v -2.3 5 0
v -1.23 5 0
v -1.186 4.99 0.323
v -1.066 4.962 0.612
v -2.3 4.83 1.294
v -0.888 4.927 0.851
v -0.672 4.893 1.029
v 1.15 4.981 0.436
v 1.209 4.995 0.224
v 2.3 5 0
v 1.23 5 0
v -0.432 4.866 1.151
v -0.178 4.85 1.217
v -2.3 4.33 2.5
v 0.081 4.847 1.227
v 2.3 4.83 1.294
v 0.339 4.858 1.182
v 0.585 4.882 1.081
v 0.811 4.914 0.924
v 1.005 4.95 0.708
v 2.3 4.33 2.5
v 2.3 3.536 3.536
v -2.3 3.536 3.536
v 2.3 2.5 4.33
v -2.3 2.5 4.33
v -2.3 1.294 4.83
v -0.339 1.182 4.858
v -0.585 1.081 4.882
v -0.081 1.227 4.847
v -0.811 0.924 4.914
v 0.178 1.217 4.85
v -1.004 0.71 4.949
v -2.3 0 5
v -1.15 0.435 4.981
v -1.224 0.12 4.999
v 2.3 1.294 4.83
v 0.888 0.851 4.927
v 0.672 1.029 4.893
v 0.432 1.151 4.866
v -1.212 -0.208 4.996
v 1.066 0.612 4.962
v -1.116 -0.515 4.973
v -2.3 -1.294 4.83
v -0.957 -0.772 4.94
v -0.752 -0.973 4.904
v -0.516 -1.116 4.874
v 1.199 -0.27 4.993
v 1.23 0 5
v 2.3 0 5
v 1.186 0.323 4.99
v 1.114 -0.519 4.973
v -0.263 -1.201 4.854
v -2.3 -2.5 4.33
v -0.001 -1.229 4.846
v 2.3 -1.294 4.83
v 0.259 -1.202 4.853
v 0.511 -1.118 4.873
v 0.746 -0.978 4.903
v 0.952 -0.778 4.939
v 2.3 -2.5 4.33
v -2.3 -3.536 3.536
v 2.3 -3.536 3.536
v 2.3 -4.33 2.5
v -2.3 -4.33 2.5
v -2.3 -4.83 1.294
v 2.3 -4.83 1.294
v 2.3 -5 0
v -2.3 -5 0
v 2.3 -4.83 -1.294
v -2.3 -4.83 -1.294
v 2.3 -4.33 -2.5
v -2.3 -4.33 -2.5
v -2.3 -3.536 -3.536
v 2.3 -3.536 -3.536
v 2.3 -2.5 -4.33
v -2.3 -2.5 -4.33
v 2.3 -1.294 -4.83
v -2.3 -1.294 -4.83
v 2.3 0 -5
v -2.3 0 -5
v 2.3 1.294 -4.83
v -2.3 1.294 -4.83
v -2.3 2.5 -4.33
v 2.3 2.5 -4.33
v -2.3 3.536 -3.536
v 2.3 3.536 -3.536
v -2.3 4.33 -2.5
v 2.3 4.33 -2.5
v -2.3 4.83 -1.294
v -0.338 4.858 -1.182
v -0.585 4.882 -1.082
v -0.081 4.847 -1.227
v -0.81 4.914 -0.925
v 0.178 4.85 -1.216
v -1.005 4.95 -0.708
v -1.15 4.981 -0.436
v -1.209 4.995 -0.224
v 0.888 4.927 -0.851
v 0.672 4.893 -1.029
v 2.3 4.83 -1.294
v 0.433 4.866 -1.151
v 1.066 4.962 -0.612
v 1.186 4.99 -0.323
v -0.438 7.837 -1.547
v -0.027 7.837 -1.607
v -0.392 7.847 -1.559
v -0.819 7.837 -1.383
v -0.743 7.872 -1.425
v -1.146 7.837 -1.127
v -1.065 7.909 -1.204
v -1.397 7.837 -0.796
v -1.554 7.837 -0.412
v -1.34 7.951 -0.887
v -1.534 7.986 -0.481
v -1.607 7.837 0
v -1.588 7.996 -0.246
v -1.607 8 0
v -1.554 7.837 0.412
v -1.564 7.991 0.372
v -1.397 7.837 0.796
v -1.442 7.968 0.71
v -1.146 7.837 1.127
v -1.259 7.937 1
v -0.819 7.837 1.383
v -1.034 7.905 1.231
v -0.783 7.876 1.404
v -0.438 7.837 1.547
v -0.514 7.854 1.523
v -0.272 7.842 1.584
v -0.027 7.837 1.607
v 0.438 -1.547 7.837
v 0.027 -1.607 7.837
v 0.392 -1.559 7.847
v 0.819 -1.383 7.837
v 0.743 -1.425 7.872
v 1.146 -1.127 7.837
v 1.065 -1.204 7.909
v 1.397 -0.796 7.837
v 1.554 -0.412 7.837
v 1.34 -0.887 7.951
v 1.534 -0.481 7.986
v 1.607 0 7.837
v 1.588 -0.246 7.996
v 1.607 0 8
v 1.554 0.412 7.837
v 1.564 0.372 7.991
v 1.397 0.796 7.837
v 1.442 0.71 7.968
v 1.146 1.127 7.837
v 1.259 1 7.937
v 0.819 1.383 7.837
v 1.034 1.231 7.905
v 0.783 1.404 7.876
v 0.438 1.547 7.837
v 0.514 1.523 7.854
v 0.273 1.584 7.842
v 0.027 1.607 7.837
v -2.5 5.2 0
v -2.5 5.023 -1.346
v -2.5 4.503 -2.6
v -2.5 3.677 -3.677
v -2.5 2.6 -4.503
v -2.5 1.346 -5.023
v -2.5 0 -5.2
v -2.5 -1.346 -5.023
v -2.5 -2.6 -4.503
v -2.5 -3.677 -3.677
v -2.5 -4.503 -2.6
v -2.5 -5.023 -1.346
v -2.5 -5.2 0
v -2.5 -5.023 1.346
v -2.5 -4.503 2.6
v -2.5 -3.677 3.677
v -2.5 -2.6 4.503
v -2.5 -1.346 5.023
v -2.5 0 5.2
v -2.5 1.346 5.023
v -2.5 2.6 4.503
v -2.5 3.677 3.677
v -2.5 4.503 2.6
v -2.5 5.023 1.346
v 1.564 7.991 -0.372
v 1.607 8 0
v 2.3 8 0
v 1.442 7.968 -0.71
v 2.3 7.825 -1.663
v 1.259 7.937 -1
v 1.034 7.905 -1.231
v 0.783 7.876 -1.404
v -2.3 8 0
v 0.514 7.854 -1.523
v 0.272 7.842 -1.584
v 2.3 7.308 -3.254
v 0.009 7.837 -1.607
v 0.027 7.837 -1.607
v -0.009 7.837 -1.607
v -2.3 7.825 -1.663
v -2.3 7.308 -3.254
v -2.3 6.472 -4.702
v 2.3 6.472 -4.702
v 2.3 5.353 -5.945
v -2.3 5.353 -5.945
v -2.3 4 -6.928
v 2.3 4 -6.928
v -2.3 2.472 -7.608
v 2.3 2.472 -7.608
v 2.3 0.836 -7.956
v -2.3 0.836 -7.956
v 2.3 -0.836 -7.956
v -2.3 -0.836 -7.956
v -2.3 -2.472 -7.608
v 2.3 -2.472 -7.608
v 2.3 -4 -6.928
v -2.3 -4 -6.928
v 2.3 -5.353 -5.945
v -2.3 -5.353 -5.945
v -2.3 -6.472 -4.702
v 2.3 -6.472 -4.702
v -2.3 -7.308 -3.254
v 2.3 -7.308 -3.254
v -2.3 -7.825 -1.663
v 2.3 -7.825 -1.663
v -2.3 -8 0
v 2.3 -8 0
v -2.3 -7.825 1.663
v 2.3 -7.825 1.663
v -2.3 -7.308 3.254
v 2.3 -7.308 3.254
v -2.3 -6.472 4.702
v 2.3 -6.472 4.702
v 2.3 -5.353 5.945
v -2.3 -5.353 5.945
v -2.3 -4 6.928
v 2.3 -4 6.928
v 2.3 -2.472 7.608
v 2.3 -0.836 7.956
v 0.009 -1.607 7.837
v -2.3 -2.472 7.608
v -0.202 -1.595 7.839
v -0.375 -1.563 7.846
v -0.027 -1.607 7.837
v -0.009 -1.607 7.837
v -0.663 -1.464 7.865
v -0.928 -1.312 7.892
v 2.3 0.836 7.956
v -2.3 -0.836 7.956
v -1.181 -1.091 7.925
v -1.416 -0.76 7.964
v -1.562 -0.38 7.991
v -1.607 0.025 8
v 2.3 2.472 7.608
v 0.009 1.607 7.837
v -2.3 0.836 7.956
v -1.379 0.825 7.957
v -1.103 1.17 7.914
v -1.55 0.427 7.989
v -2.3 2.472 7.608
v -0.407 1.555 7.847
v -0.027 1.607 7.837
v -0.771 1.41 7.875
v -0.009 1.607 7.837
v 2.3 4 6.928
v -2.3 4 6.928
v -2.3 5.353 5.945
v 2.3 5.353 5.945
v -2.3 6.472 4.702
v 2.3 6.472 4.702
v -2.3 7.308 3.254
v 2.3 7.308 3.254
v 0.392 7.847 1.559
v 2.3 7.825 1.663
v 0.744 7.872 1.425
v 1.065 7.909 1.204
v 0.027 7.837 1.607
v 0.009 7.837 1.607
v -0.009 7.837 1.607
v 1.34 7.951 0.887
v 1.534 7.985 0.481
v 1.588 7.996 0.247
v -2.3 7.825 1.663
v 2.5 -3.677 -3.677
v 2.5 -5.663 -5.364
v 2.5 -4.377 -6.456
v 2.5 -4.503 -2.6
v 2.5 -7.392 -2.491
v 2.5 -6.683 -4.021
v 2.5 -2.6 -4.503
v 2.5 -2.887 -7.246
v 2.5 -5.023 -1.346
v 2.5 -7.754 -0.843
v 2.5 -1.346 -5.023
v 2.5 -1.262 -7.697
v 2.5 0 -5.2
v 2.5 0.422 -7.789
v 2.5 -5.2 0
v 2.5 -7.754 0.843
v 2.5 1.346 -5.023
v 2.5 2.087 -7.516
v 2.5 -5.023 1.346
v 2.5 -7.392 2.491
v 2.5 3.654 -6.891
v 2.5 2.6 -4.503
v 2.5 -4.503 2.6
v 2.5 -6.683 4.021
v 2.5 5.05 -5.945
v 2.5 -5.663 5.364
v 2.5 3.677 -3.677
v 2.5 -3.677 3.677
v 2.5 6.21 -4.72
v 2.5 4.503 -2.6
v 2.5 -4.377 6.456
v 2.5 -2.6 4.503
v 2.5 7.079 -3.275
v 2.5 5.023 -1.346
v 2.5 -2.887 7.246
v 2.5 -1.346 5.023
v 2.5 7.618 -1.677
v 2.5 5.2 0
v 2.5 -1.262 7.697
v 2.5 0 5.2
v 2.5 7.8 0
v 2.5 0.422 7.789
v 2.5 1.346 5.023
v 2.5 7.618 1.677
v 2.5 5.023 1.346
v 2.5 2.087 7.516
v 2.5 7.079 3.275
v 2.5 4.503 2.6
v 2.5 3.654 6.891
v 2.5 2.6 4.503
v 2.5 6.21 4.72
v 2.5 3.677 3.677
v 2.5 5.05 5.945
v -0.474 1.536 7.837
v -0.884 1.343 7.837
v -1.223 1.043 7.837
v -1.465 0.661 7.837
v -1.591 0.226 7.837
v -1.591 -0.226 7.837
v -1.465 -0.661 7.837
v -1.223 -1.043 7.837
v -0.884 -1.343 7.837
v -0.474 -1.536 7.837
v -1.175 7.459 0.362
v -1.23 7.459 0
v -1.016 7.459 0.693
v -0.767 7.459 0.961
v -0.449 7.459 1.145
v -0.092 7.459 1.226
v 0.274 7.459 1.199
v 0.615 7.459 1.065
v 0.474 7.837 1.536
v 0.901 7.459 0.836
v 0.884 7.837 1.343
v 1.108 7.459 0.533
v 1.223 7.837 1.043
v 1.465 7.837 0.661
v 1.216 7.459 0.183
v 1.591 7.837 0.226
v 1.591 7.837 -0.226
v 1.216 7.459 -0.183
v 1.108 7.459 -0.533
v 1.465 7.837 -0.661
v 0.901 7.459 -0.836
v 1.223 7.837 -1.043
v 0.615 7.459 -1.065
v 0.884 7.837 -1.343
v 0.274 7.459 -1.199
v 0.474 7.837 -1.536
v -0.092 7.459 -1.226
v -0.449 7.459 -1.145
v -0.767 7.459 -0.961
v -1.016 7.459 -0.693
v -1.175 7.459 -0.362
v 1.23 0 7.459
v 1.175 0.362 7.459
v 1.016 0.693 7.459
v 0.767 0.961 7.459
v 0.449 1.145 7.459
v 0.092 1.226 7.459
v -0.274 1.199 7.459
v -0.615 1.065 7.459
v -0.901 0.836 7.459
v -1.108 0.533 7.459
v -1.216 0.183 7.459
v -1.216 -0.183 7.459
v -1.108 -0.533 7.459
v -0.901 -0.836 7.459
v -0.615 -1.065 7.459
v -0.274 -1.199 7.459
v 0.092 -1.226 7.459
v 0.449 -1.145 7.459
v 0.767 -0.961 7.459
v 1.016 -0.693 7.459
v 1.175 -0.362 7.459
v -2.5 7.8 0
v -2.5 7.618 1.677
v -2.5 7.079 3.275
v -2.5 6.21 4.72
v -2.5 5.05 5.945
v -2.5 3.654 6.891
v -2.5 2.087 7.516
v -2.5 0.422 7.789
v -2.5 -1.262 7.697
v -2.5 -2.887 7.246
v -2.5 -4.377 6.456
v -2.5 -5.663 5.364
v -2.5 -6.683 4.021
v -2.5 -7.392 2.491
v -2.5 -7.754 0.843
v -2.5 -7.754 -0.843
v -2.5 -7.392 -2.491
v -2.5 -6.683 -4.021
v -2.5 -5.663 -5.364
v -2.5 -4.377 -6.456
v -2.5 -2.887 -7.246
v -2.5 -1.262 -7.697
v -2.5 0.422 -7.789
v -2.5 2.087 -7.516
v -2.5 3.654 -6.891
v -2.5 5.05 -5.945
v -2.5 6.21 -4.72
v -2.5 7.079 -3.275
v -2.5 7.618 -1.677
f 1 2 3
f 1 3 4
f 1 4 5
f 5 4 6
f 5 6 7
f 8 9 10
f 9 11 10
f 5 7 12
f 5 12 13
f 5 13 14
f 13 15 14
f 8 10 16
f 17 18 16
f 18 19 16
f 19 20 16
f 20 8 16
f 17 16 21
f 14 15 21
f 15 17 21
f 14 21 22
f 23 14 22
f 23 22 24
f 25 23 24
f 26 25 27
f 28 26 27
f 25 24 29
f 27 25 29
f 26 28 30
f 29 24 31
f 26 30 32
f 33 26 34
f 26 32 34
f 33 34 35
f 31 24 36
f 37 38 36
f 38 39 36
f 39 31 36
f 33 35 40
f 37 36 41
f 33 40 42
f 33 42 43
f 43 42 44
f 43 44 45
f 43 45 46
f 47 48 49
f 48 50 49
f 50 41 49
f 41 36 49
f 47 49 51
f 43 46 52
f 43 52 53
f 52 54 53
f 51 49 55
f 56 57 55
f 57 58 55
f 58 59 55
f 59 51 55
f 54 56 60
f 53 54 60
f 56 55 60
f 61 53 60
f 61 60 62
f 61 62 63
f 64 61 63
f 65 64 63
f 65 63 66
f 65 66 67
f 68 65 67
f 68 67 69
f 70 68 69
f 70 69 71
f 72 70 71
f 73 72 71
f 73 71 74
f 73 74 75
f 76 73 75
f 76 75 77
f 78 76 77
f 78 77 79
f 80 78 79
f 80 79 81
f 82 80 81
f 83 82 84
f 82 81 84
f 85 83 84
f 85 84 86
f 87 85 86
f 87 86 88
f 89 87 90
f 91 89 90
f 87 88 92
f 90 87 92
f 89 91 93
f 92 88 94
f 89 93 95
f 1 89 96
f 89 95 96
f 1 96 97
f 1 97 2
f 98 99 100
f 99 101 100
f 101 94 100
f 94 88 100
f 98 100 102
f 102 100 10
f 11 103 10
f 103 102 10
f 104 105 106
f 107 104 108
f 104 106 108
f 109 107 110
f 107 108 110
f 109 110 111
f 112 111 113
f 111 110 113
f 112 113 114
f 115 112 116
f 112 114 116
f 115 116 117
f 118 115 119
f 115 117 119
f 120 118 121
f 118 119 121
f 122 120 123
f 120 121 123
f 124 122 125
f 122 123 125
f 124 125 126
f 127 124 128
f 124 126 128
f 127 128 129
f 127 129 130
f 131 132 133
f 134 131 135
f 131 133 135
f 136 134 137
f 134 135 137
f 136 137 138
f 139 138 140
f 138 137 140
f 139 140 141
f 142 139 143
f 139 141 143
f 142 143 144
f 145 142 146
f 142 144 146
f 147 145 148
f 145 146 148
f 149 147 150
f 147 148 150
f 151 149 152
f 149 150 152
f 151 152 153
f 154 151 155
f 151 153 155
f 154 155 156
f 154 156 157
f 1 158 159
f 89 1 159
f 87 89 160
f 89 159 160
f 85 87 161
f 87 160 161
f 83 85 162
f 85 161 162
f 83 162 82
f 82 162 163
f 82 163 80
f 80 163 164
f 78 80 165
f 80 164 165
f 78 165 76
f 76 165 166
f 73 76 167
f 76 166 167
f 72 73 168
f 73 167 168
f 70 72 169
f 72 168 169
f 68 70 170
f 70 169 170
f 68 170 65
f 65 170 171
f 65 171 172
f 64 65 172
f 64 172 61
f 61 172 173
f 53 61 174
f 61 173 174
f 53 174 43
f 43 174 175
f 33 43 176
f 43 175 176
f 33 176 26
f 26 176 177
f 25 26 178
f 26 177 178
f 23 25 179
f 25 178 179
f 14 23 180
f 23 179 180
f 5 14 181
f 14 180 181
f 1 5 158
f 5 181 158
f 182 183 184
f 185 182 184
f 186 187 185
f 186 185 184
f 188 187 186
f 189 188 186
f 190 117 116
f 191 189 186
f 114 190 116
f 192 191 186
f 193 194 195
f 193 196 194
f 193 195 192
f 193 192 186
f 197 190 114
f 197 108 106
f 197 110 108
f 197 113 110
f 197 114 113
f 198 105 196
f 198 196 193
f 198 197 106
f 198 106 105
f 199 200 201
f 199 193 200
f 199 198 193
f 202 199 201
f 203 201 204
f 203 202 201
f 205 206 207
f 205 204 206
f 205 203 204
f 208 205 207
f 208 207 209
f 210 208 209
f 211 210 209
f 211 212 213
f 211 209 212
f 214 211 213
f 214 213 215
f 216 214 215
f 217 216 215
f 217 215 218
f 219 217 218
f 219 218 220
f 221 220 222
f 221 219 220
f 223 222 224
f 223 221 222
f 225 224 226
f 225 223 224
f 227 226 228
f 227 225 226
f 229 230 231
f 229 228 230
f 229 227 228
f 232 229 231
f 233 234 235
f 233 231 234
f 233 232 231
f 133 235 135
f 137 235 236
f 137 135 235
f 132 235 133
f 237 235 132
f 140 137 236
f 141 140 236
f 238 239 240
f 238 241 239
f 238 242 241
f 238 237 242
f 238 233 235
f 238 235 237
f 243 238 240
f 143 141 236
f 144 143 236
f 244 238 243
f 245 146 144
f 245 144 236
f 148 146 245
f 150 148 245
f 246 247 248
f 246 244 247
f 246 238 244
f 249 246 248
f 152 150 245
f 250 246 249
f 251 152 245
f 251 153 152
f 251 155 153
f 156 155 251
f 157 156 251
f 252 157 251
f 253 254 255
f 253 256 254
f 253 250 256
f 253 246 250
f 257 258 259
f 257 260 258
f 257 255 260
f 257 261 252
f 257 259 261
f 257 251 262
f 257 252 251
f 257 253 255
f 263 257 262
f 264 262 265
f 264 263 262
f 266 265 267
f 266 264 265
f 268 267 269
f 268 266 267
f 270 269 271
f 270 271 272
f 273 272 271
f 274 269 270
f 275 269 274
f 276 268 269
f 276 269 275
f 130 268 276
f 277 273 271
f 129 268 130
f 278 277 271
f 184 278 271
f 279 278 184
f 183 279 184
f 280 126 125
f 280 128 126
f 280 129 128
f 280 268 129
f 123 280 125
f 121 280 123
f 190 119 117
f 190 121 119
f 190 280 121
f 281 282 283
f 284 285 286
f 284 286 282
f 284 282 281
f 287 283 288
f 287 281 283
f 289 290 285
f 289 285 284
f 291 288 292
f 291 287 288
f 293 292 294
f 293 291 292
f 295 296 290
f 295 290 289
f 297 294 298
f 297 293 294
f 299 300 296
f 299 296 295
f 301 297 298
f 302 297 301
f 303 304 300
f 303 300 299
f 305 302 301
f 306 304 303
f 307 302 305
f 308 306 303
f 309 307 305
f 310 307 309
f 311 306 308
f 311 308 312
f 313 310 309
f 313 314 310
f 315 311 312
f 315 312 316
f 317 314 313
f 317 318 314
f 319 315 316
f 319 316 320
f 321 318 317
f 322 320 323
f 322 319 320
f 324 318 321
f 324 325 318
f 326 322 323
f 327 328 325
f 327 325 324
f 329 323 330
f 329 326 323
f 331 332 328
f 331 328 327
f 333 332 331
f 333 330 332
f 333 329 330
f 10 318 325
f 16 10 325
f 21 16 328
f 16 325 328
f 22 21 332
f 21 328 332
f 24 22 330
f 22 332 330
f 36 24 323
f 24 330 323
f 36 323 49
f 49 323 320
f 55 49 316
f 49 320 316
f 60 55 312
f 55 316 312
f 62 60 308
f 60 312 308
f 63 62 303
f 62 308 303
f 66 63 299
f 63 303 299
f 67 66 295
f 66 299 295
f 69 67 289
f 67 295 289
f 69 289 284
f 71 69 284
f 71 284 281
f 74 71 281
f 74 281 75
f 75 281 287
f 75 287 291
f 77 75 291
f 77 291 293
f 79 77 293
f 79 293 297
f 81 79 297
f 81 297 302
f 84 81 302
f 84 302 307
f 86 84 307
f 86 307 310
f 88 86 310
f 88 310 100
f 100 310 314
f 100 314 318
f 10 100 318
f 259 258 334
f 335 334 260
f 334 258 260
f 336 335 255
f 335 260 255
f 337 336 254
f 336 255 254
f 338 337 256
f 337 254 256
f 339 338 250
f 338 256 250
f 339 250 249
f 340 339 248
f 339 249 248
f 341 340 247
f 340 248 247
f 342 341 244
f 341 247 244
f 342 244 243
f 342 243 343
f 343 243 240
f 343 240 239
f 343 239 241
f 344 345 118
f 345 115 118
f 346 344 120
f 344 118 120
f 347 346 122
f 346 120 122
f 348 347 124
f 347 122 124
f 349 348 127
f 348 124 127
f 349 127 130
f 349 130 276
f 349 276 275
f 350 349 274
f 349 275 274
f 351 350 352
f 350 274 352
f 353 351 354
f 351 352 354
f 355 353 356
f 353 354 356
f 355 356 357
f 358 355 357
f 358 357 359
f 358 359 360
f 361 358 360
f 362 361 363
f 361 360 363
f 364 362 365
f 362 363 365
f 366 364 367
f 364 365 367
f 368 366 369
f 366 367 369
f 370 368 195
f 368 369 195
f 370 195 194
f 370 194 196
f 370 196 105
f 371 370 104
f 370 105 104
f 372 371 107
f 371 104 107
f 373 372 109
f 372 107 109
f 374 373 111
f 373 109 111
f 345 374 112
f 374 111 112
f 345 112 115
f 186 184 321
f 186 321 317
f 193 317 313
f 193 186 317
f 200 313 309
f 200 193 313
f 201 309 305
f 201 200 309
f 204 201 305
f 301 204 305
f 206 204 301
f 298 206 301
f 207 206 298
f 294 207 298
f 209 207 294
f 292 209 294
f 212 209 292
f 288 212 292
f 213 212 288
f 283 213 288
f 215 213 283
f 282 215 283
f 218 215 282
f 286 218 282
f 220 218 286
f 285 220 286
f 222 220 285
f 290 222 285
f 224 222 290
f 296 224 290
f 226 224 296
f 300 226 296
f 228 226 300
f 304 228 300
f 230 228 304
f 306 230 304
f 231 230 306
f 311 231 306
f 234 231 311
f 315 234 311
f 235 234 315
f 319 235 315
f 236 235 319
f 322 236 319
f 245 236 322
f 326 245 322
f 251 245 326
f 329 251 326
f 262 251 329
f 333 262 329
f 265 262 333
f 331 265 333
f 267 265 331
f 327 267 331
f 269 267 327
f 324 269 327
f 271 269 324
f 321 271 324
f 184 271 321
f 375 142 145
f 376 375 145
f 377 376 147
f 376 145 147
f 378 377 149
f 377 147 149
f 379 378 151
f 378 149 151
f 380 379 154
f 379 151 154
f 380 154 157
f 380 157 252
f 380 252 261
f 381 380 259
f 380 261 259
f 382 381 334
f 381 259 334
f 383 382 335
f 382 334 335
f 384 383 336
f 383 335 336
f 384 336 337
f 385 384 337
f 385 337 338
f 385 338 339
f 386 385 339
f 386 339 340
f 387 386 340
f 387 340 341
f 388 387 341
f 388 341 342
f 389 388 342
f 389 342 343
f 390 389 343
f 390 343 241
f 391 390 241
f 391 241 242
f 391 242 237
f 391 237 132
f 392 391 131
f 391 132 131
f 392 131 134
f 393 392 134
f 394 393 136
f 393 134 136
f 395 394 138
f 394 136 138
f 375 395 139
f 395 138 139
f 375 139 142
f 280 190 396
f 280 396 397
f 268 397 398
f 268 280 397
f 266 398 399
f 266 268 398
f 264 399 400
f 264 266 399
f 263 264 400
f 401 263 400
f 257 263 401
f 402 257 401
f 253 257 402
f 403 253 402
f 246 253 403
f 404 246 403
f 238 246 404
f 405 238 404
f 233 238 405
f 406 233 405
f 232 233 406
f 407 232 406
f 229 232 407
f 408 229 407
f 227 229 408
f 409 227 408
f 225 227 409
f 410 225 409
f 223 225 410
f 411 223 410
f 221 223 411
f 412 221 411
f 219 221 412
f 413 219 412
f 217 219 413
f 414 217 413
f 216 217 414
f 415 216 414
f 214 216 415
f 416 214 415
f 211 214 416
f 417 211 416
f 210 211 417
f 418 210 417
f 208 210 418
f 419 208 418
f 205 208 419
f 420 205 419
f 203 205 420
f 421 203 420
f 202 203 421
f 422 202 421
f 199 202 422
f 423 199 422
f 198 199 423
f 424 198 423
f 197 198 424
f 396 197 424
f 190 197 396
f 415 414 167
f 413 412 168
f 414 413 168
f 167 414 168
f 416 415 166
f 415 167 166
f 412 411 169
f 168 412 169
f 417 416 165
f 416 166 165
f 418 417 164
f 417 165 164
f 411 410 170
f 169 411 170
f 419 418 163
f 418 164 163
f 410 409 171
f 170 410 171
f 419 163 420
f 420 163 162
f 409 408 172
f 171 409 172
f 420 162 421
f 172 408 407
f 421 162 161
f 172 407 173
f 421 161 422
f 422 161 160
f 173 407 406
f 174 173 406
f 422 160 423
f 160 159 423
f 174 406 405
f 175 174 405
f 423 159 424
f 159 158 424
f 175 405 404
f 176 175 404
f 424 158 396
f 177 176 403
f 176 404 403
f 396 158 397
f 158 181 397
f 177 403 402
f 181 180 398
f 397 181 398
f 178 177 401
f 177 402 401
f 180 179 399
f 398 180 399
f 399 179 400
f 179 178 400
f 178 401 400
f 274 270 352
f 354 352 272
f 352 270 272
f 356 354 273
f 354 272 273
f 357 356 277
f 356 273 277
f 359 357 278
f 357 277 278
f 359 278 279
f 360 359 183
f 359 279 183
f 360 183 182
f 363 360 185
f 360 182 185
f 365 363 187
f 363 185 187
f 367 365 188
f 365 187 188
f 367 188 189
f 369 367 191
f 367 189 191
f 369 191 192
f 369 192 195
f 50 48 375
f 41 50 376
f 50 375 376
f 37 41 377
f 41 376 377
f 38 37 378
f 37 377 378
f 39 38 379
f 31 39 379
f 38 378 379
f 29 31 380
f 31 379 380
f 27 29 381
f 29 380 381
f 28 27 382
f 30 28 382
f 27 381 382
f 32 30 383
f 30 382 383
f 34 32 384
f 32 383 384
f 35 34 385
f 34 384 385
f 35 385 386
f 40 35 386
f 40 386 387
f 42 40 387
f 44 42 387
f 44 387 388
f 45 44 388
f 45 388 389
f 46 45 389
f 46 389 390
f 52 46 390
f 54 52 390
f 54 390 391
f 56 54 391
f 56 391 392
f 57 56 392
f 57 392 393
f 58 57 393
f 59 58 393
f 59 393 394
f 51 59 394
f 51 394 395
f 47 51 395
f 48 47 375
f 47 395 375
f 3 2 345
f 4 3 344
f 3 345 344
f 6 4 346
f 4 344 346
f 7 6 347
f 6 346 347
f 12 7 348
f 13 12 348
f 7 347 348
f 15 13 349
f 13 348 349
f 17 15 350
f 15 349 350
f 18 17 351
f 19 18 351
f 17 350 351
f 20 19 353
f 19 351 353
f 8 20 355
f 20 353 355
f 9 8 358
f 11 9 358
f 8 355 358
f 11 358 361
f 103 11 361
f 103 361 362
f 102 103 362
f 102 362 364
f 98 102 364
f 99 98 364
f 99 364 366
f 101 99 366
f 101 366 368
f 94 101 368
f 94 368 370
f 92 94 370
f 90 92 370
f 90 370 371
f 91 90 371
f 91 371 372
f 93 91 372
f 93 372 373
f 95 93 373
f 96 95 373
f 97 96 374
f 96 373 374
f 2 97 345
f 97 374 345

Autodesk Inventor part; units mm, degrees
sketch "Sketch_1" plane through (0, 0, 0) normal (0, 0, 1) x (1, 0, 0)
  line L0 (2, 0) -> (-2, 0)
  line L1 (-2.5, 5.2) -> (-2.3, 5)
  line L2 (-2.3, 5) -> (2.3, 5)
  line L3 (2.3, 5) -> (2.5, 5.2)
  line L4 (2.5, 5.2) -> (2.5, 7.8)
  line L5 (2.5, 7.8) -> (2.3, 8)
  line L6 (2.3, 8) -> (-2.3, 8)
  line L7 (-2.3, 8) -> (-2.5, 7.8)
  line L8 (-2.5, 7.8) -> (-2.5, 5.2)
revolve "Revolution1" add sketch "Sketch_1" angle 360 about axis through (2, 0, 0) along (1, 0, 0)
sketch "Sketch_2" plane through (0, 0, 0) normal (0, 1, 0) x (-1, 0, 0)
  line L0 (0, 8) -> (0, 5)
  line L1 (0, 4) -> (-1.2295, 4)
  line L2 (-1.2295, 4) -> (-1.2295, 7.459)
  line L3 (-1.2295, 7.459) -> (-1.6074, 7.8369)
  line L4 (-1.6074, 7.8369) -> (-1.6074, 8.25)
  line L5 (-1.6074, 8.25) -> (0, 8.25)
  line L6 (0, 8.25) -> (0, 4)
revolve "Revolution2" cut sketch "Sketch_2" angle 360 about axis through (0, 0, 8) along (0, 0, 1)
thread "Thread1" size "M3x0.5" class "6H" standard "ISO Metric profile" length 2.459
sketch "Sketch_6" plane through (0, 0, 0) normal (0, 0, 1) x (1, 0, 0)
  line L0 (0, 8) -> (0, 5)
  line L1 (0, 4) -> (-1.2295, 4)
  line L2 (-1.2295, 4) -> (-1.2295, 7.459)
  line L3 (-1.2295, 7.459) -> (-1.6074, 7.8369)
  line L4 (-1.6074, 7.8369) -> (-1.6074, 8.25)
  line L5 (-1.6074, 8.25) -> (0, 8.25)
  line L6 (0, 8.25) -> (0, 4)
revolve "Revolution3" cut sketch "Sketch_6" angle 360 about axis through (0, 8, 0) along (0, 1, 0)
thread "Thread2" size "M3x0.5" class "6H" standard "ISO Metric profile" length 2.459
ref_plane "to_screw1_XY" through (0, 5, 0) normal (0, 1, 0) x (1, 0, 0)
ref_plane "to_screw1_YZ" through (0, 5, 0) normal (1, 0, 0) x (0, 0, -1)
ref_plane "to_screw1_ZX" through (0, 5, 0) normal (0, 0, -1) x (0, 1, 0)
ref_plane "to_screw2_XY" through (0, 0, 5) normal (0, 0, 1) x (1, 0, 0)
ref_plane "to_screw2_YZ" through (0, 0, 5) normal (1, 0, 0) x (0, 1, 0)
ref_plane "to_screw2_ZX" through (0, 0, 5) normal (0, 1, 0) x (0, 0, 1)
properties part number "SCCJ10-5_b"
